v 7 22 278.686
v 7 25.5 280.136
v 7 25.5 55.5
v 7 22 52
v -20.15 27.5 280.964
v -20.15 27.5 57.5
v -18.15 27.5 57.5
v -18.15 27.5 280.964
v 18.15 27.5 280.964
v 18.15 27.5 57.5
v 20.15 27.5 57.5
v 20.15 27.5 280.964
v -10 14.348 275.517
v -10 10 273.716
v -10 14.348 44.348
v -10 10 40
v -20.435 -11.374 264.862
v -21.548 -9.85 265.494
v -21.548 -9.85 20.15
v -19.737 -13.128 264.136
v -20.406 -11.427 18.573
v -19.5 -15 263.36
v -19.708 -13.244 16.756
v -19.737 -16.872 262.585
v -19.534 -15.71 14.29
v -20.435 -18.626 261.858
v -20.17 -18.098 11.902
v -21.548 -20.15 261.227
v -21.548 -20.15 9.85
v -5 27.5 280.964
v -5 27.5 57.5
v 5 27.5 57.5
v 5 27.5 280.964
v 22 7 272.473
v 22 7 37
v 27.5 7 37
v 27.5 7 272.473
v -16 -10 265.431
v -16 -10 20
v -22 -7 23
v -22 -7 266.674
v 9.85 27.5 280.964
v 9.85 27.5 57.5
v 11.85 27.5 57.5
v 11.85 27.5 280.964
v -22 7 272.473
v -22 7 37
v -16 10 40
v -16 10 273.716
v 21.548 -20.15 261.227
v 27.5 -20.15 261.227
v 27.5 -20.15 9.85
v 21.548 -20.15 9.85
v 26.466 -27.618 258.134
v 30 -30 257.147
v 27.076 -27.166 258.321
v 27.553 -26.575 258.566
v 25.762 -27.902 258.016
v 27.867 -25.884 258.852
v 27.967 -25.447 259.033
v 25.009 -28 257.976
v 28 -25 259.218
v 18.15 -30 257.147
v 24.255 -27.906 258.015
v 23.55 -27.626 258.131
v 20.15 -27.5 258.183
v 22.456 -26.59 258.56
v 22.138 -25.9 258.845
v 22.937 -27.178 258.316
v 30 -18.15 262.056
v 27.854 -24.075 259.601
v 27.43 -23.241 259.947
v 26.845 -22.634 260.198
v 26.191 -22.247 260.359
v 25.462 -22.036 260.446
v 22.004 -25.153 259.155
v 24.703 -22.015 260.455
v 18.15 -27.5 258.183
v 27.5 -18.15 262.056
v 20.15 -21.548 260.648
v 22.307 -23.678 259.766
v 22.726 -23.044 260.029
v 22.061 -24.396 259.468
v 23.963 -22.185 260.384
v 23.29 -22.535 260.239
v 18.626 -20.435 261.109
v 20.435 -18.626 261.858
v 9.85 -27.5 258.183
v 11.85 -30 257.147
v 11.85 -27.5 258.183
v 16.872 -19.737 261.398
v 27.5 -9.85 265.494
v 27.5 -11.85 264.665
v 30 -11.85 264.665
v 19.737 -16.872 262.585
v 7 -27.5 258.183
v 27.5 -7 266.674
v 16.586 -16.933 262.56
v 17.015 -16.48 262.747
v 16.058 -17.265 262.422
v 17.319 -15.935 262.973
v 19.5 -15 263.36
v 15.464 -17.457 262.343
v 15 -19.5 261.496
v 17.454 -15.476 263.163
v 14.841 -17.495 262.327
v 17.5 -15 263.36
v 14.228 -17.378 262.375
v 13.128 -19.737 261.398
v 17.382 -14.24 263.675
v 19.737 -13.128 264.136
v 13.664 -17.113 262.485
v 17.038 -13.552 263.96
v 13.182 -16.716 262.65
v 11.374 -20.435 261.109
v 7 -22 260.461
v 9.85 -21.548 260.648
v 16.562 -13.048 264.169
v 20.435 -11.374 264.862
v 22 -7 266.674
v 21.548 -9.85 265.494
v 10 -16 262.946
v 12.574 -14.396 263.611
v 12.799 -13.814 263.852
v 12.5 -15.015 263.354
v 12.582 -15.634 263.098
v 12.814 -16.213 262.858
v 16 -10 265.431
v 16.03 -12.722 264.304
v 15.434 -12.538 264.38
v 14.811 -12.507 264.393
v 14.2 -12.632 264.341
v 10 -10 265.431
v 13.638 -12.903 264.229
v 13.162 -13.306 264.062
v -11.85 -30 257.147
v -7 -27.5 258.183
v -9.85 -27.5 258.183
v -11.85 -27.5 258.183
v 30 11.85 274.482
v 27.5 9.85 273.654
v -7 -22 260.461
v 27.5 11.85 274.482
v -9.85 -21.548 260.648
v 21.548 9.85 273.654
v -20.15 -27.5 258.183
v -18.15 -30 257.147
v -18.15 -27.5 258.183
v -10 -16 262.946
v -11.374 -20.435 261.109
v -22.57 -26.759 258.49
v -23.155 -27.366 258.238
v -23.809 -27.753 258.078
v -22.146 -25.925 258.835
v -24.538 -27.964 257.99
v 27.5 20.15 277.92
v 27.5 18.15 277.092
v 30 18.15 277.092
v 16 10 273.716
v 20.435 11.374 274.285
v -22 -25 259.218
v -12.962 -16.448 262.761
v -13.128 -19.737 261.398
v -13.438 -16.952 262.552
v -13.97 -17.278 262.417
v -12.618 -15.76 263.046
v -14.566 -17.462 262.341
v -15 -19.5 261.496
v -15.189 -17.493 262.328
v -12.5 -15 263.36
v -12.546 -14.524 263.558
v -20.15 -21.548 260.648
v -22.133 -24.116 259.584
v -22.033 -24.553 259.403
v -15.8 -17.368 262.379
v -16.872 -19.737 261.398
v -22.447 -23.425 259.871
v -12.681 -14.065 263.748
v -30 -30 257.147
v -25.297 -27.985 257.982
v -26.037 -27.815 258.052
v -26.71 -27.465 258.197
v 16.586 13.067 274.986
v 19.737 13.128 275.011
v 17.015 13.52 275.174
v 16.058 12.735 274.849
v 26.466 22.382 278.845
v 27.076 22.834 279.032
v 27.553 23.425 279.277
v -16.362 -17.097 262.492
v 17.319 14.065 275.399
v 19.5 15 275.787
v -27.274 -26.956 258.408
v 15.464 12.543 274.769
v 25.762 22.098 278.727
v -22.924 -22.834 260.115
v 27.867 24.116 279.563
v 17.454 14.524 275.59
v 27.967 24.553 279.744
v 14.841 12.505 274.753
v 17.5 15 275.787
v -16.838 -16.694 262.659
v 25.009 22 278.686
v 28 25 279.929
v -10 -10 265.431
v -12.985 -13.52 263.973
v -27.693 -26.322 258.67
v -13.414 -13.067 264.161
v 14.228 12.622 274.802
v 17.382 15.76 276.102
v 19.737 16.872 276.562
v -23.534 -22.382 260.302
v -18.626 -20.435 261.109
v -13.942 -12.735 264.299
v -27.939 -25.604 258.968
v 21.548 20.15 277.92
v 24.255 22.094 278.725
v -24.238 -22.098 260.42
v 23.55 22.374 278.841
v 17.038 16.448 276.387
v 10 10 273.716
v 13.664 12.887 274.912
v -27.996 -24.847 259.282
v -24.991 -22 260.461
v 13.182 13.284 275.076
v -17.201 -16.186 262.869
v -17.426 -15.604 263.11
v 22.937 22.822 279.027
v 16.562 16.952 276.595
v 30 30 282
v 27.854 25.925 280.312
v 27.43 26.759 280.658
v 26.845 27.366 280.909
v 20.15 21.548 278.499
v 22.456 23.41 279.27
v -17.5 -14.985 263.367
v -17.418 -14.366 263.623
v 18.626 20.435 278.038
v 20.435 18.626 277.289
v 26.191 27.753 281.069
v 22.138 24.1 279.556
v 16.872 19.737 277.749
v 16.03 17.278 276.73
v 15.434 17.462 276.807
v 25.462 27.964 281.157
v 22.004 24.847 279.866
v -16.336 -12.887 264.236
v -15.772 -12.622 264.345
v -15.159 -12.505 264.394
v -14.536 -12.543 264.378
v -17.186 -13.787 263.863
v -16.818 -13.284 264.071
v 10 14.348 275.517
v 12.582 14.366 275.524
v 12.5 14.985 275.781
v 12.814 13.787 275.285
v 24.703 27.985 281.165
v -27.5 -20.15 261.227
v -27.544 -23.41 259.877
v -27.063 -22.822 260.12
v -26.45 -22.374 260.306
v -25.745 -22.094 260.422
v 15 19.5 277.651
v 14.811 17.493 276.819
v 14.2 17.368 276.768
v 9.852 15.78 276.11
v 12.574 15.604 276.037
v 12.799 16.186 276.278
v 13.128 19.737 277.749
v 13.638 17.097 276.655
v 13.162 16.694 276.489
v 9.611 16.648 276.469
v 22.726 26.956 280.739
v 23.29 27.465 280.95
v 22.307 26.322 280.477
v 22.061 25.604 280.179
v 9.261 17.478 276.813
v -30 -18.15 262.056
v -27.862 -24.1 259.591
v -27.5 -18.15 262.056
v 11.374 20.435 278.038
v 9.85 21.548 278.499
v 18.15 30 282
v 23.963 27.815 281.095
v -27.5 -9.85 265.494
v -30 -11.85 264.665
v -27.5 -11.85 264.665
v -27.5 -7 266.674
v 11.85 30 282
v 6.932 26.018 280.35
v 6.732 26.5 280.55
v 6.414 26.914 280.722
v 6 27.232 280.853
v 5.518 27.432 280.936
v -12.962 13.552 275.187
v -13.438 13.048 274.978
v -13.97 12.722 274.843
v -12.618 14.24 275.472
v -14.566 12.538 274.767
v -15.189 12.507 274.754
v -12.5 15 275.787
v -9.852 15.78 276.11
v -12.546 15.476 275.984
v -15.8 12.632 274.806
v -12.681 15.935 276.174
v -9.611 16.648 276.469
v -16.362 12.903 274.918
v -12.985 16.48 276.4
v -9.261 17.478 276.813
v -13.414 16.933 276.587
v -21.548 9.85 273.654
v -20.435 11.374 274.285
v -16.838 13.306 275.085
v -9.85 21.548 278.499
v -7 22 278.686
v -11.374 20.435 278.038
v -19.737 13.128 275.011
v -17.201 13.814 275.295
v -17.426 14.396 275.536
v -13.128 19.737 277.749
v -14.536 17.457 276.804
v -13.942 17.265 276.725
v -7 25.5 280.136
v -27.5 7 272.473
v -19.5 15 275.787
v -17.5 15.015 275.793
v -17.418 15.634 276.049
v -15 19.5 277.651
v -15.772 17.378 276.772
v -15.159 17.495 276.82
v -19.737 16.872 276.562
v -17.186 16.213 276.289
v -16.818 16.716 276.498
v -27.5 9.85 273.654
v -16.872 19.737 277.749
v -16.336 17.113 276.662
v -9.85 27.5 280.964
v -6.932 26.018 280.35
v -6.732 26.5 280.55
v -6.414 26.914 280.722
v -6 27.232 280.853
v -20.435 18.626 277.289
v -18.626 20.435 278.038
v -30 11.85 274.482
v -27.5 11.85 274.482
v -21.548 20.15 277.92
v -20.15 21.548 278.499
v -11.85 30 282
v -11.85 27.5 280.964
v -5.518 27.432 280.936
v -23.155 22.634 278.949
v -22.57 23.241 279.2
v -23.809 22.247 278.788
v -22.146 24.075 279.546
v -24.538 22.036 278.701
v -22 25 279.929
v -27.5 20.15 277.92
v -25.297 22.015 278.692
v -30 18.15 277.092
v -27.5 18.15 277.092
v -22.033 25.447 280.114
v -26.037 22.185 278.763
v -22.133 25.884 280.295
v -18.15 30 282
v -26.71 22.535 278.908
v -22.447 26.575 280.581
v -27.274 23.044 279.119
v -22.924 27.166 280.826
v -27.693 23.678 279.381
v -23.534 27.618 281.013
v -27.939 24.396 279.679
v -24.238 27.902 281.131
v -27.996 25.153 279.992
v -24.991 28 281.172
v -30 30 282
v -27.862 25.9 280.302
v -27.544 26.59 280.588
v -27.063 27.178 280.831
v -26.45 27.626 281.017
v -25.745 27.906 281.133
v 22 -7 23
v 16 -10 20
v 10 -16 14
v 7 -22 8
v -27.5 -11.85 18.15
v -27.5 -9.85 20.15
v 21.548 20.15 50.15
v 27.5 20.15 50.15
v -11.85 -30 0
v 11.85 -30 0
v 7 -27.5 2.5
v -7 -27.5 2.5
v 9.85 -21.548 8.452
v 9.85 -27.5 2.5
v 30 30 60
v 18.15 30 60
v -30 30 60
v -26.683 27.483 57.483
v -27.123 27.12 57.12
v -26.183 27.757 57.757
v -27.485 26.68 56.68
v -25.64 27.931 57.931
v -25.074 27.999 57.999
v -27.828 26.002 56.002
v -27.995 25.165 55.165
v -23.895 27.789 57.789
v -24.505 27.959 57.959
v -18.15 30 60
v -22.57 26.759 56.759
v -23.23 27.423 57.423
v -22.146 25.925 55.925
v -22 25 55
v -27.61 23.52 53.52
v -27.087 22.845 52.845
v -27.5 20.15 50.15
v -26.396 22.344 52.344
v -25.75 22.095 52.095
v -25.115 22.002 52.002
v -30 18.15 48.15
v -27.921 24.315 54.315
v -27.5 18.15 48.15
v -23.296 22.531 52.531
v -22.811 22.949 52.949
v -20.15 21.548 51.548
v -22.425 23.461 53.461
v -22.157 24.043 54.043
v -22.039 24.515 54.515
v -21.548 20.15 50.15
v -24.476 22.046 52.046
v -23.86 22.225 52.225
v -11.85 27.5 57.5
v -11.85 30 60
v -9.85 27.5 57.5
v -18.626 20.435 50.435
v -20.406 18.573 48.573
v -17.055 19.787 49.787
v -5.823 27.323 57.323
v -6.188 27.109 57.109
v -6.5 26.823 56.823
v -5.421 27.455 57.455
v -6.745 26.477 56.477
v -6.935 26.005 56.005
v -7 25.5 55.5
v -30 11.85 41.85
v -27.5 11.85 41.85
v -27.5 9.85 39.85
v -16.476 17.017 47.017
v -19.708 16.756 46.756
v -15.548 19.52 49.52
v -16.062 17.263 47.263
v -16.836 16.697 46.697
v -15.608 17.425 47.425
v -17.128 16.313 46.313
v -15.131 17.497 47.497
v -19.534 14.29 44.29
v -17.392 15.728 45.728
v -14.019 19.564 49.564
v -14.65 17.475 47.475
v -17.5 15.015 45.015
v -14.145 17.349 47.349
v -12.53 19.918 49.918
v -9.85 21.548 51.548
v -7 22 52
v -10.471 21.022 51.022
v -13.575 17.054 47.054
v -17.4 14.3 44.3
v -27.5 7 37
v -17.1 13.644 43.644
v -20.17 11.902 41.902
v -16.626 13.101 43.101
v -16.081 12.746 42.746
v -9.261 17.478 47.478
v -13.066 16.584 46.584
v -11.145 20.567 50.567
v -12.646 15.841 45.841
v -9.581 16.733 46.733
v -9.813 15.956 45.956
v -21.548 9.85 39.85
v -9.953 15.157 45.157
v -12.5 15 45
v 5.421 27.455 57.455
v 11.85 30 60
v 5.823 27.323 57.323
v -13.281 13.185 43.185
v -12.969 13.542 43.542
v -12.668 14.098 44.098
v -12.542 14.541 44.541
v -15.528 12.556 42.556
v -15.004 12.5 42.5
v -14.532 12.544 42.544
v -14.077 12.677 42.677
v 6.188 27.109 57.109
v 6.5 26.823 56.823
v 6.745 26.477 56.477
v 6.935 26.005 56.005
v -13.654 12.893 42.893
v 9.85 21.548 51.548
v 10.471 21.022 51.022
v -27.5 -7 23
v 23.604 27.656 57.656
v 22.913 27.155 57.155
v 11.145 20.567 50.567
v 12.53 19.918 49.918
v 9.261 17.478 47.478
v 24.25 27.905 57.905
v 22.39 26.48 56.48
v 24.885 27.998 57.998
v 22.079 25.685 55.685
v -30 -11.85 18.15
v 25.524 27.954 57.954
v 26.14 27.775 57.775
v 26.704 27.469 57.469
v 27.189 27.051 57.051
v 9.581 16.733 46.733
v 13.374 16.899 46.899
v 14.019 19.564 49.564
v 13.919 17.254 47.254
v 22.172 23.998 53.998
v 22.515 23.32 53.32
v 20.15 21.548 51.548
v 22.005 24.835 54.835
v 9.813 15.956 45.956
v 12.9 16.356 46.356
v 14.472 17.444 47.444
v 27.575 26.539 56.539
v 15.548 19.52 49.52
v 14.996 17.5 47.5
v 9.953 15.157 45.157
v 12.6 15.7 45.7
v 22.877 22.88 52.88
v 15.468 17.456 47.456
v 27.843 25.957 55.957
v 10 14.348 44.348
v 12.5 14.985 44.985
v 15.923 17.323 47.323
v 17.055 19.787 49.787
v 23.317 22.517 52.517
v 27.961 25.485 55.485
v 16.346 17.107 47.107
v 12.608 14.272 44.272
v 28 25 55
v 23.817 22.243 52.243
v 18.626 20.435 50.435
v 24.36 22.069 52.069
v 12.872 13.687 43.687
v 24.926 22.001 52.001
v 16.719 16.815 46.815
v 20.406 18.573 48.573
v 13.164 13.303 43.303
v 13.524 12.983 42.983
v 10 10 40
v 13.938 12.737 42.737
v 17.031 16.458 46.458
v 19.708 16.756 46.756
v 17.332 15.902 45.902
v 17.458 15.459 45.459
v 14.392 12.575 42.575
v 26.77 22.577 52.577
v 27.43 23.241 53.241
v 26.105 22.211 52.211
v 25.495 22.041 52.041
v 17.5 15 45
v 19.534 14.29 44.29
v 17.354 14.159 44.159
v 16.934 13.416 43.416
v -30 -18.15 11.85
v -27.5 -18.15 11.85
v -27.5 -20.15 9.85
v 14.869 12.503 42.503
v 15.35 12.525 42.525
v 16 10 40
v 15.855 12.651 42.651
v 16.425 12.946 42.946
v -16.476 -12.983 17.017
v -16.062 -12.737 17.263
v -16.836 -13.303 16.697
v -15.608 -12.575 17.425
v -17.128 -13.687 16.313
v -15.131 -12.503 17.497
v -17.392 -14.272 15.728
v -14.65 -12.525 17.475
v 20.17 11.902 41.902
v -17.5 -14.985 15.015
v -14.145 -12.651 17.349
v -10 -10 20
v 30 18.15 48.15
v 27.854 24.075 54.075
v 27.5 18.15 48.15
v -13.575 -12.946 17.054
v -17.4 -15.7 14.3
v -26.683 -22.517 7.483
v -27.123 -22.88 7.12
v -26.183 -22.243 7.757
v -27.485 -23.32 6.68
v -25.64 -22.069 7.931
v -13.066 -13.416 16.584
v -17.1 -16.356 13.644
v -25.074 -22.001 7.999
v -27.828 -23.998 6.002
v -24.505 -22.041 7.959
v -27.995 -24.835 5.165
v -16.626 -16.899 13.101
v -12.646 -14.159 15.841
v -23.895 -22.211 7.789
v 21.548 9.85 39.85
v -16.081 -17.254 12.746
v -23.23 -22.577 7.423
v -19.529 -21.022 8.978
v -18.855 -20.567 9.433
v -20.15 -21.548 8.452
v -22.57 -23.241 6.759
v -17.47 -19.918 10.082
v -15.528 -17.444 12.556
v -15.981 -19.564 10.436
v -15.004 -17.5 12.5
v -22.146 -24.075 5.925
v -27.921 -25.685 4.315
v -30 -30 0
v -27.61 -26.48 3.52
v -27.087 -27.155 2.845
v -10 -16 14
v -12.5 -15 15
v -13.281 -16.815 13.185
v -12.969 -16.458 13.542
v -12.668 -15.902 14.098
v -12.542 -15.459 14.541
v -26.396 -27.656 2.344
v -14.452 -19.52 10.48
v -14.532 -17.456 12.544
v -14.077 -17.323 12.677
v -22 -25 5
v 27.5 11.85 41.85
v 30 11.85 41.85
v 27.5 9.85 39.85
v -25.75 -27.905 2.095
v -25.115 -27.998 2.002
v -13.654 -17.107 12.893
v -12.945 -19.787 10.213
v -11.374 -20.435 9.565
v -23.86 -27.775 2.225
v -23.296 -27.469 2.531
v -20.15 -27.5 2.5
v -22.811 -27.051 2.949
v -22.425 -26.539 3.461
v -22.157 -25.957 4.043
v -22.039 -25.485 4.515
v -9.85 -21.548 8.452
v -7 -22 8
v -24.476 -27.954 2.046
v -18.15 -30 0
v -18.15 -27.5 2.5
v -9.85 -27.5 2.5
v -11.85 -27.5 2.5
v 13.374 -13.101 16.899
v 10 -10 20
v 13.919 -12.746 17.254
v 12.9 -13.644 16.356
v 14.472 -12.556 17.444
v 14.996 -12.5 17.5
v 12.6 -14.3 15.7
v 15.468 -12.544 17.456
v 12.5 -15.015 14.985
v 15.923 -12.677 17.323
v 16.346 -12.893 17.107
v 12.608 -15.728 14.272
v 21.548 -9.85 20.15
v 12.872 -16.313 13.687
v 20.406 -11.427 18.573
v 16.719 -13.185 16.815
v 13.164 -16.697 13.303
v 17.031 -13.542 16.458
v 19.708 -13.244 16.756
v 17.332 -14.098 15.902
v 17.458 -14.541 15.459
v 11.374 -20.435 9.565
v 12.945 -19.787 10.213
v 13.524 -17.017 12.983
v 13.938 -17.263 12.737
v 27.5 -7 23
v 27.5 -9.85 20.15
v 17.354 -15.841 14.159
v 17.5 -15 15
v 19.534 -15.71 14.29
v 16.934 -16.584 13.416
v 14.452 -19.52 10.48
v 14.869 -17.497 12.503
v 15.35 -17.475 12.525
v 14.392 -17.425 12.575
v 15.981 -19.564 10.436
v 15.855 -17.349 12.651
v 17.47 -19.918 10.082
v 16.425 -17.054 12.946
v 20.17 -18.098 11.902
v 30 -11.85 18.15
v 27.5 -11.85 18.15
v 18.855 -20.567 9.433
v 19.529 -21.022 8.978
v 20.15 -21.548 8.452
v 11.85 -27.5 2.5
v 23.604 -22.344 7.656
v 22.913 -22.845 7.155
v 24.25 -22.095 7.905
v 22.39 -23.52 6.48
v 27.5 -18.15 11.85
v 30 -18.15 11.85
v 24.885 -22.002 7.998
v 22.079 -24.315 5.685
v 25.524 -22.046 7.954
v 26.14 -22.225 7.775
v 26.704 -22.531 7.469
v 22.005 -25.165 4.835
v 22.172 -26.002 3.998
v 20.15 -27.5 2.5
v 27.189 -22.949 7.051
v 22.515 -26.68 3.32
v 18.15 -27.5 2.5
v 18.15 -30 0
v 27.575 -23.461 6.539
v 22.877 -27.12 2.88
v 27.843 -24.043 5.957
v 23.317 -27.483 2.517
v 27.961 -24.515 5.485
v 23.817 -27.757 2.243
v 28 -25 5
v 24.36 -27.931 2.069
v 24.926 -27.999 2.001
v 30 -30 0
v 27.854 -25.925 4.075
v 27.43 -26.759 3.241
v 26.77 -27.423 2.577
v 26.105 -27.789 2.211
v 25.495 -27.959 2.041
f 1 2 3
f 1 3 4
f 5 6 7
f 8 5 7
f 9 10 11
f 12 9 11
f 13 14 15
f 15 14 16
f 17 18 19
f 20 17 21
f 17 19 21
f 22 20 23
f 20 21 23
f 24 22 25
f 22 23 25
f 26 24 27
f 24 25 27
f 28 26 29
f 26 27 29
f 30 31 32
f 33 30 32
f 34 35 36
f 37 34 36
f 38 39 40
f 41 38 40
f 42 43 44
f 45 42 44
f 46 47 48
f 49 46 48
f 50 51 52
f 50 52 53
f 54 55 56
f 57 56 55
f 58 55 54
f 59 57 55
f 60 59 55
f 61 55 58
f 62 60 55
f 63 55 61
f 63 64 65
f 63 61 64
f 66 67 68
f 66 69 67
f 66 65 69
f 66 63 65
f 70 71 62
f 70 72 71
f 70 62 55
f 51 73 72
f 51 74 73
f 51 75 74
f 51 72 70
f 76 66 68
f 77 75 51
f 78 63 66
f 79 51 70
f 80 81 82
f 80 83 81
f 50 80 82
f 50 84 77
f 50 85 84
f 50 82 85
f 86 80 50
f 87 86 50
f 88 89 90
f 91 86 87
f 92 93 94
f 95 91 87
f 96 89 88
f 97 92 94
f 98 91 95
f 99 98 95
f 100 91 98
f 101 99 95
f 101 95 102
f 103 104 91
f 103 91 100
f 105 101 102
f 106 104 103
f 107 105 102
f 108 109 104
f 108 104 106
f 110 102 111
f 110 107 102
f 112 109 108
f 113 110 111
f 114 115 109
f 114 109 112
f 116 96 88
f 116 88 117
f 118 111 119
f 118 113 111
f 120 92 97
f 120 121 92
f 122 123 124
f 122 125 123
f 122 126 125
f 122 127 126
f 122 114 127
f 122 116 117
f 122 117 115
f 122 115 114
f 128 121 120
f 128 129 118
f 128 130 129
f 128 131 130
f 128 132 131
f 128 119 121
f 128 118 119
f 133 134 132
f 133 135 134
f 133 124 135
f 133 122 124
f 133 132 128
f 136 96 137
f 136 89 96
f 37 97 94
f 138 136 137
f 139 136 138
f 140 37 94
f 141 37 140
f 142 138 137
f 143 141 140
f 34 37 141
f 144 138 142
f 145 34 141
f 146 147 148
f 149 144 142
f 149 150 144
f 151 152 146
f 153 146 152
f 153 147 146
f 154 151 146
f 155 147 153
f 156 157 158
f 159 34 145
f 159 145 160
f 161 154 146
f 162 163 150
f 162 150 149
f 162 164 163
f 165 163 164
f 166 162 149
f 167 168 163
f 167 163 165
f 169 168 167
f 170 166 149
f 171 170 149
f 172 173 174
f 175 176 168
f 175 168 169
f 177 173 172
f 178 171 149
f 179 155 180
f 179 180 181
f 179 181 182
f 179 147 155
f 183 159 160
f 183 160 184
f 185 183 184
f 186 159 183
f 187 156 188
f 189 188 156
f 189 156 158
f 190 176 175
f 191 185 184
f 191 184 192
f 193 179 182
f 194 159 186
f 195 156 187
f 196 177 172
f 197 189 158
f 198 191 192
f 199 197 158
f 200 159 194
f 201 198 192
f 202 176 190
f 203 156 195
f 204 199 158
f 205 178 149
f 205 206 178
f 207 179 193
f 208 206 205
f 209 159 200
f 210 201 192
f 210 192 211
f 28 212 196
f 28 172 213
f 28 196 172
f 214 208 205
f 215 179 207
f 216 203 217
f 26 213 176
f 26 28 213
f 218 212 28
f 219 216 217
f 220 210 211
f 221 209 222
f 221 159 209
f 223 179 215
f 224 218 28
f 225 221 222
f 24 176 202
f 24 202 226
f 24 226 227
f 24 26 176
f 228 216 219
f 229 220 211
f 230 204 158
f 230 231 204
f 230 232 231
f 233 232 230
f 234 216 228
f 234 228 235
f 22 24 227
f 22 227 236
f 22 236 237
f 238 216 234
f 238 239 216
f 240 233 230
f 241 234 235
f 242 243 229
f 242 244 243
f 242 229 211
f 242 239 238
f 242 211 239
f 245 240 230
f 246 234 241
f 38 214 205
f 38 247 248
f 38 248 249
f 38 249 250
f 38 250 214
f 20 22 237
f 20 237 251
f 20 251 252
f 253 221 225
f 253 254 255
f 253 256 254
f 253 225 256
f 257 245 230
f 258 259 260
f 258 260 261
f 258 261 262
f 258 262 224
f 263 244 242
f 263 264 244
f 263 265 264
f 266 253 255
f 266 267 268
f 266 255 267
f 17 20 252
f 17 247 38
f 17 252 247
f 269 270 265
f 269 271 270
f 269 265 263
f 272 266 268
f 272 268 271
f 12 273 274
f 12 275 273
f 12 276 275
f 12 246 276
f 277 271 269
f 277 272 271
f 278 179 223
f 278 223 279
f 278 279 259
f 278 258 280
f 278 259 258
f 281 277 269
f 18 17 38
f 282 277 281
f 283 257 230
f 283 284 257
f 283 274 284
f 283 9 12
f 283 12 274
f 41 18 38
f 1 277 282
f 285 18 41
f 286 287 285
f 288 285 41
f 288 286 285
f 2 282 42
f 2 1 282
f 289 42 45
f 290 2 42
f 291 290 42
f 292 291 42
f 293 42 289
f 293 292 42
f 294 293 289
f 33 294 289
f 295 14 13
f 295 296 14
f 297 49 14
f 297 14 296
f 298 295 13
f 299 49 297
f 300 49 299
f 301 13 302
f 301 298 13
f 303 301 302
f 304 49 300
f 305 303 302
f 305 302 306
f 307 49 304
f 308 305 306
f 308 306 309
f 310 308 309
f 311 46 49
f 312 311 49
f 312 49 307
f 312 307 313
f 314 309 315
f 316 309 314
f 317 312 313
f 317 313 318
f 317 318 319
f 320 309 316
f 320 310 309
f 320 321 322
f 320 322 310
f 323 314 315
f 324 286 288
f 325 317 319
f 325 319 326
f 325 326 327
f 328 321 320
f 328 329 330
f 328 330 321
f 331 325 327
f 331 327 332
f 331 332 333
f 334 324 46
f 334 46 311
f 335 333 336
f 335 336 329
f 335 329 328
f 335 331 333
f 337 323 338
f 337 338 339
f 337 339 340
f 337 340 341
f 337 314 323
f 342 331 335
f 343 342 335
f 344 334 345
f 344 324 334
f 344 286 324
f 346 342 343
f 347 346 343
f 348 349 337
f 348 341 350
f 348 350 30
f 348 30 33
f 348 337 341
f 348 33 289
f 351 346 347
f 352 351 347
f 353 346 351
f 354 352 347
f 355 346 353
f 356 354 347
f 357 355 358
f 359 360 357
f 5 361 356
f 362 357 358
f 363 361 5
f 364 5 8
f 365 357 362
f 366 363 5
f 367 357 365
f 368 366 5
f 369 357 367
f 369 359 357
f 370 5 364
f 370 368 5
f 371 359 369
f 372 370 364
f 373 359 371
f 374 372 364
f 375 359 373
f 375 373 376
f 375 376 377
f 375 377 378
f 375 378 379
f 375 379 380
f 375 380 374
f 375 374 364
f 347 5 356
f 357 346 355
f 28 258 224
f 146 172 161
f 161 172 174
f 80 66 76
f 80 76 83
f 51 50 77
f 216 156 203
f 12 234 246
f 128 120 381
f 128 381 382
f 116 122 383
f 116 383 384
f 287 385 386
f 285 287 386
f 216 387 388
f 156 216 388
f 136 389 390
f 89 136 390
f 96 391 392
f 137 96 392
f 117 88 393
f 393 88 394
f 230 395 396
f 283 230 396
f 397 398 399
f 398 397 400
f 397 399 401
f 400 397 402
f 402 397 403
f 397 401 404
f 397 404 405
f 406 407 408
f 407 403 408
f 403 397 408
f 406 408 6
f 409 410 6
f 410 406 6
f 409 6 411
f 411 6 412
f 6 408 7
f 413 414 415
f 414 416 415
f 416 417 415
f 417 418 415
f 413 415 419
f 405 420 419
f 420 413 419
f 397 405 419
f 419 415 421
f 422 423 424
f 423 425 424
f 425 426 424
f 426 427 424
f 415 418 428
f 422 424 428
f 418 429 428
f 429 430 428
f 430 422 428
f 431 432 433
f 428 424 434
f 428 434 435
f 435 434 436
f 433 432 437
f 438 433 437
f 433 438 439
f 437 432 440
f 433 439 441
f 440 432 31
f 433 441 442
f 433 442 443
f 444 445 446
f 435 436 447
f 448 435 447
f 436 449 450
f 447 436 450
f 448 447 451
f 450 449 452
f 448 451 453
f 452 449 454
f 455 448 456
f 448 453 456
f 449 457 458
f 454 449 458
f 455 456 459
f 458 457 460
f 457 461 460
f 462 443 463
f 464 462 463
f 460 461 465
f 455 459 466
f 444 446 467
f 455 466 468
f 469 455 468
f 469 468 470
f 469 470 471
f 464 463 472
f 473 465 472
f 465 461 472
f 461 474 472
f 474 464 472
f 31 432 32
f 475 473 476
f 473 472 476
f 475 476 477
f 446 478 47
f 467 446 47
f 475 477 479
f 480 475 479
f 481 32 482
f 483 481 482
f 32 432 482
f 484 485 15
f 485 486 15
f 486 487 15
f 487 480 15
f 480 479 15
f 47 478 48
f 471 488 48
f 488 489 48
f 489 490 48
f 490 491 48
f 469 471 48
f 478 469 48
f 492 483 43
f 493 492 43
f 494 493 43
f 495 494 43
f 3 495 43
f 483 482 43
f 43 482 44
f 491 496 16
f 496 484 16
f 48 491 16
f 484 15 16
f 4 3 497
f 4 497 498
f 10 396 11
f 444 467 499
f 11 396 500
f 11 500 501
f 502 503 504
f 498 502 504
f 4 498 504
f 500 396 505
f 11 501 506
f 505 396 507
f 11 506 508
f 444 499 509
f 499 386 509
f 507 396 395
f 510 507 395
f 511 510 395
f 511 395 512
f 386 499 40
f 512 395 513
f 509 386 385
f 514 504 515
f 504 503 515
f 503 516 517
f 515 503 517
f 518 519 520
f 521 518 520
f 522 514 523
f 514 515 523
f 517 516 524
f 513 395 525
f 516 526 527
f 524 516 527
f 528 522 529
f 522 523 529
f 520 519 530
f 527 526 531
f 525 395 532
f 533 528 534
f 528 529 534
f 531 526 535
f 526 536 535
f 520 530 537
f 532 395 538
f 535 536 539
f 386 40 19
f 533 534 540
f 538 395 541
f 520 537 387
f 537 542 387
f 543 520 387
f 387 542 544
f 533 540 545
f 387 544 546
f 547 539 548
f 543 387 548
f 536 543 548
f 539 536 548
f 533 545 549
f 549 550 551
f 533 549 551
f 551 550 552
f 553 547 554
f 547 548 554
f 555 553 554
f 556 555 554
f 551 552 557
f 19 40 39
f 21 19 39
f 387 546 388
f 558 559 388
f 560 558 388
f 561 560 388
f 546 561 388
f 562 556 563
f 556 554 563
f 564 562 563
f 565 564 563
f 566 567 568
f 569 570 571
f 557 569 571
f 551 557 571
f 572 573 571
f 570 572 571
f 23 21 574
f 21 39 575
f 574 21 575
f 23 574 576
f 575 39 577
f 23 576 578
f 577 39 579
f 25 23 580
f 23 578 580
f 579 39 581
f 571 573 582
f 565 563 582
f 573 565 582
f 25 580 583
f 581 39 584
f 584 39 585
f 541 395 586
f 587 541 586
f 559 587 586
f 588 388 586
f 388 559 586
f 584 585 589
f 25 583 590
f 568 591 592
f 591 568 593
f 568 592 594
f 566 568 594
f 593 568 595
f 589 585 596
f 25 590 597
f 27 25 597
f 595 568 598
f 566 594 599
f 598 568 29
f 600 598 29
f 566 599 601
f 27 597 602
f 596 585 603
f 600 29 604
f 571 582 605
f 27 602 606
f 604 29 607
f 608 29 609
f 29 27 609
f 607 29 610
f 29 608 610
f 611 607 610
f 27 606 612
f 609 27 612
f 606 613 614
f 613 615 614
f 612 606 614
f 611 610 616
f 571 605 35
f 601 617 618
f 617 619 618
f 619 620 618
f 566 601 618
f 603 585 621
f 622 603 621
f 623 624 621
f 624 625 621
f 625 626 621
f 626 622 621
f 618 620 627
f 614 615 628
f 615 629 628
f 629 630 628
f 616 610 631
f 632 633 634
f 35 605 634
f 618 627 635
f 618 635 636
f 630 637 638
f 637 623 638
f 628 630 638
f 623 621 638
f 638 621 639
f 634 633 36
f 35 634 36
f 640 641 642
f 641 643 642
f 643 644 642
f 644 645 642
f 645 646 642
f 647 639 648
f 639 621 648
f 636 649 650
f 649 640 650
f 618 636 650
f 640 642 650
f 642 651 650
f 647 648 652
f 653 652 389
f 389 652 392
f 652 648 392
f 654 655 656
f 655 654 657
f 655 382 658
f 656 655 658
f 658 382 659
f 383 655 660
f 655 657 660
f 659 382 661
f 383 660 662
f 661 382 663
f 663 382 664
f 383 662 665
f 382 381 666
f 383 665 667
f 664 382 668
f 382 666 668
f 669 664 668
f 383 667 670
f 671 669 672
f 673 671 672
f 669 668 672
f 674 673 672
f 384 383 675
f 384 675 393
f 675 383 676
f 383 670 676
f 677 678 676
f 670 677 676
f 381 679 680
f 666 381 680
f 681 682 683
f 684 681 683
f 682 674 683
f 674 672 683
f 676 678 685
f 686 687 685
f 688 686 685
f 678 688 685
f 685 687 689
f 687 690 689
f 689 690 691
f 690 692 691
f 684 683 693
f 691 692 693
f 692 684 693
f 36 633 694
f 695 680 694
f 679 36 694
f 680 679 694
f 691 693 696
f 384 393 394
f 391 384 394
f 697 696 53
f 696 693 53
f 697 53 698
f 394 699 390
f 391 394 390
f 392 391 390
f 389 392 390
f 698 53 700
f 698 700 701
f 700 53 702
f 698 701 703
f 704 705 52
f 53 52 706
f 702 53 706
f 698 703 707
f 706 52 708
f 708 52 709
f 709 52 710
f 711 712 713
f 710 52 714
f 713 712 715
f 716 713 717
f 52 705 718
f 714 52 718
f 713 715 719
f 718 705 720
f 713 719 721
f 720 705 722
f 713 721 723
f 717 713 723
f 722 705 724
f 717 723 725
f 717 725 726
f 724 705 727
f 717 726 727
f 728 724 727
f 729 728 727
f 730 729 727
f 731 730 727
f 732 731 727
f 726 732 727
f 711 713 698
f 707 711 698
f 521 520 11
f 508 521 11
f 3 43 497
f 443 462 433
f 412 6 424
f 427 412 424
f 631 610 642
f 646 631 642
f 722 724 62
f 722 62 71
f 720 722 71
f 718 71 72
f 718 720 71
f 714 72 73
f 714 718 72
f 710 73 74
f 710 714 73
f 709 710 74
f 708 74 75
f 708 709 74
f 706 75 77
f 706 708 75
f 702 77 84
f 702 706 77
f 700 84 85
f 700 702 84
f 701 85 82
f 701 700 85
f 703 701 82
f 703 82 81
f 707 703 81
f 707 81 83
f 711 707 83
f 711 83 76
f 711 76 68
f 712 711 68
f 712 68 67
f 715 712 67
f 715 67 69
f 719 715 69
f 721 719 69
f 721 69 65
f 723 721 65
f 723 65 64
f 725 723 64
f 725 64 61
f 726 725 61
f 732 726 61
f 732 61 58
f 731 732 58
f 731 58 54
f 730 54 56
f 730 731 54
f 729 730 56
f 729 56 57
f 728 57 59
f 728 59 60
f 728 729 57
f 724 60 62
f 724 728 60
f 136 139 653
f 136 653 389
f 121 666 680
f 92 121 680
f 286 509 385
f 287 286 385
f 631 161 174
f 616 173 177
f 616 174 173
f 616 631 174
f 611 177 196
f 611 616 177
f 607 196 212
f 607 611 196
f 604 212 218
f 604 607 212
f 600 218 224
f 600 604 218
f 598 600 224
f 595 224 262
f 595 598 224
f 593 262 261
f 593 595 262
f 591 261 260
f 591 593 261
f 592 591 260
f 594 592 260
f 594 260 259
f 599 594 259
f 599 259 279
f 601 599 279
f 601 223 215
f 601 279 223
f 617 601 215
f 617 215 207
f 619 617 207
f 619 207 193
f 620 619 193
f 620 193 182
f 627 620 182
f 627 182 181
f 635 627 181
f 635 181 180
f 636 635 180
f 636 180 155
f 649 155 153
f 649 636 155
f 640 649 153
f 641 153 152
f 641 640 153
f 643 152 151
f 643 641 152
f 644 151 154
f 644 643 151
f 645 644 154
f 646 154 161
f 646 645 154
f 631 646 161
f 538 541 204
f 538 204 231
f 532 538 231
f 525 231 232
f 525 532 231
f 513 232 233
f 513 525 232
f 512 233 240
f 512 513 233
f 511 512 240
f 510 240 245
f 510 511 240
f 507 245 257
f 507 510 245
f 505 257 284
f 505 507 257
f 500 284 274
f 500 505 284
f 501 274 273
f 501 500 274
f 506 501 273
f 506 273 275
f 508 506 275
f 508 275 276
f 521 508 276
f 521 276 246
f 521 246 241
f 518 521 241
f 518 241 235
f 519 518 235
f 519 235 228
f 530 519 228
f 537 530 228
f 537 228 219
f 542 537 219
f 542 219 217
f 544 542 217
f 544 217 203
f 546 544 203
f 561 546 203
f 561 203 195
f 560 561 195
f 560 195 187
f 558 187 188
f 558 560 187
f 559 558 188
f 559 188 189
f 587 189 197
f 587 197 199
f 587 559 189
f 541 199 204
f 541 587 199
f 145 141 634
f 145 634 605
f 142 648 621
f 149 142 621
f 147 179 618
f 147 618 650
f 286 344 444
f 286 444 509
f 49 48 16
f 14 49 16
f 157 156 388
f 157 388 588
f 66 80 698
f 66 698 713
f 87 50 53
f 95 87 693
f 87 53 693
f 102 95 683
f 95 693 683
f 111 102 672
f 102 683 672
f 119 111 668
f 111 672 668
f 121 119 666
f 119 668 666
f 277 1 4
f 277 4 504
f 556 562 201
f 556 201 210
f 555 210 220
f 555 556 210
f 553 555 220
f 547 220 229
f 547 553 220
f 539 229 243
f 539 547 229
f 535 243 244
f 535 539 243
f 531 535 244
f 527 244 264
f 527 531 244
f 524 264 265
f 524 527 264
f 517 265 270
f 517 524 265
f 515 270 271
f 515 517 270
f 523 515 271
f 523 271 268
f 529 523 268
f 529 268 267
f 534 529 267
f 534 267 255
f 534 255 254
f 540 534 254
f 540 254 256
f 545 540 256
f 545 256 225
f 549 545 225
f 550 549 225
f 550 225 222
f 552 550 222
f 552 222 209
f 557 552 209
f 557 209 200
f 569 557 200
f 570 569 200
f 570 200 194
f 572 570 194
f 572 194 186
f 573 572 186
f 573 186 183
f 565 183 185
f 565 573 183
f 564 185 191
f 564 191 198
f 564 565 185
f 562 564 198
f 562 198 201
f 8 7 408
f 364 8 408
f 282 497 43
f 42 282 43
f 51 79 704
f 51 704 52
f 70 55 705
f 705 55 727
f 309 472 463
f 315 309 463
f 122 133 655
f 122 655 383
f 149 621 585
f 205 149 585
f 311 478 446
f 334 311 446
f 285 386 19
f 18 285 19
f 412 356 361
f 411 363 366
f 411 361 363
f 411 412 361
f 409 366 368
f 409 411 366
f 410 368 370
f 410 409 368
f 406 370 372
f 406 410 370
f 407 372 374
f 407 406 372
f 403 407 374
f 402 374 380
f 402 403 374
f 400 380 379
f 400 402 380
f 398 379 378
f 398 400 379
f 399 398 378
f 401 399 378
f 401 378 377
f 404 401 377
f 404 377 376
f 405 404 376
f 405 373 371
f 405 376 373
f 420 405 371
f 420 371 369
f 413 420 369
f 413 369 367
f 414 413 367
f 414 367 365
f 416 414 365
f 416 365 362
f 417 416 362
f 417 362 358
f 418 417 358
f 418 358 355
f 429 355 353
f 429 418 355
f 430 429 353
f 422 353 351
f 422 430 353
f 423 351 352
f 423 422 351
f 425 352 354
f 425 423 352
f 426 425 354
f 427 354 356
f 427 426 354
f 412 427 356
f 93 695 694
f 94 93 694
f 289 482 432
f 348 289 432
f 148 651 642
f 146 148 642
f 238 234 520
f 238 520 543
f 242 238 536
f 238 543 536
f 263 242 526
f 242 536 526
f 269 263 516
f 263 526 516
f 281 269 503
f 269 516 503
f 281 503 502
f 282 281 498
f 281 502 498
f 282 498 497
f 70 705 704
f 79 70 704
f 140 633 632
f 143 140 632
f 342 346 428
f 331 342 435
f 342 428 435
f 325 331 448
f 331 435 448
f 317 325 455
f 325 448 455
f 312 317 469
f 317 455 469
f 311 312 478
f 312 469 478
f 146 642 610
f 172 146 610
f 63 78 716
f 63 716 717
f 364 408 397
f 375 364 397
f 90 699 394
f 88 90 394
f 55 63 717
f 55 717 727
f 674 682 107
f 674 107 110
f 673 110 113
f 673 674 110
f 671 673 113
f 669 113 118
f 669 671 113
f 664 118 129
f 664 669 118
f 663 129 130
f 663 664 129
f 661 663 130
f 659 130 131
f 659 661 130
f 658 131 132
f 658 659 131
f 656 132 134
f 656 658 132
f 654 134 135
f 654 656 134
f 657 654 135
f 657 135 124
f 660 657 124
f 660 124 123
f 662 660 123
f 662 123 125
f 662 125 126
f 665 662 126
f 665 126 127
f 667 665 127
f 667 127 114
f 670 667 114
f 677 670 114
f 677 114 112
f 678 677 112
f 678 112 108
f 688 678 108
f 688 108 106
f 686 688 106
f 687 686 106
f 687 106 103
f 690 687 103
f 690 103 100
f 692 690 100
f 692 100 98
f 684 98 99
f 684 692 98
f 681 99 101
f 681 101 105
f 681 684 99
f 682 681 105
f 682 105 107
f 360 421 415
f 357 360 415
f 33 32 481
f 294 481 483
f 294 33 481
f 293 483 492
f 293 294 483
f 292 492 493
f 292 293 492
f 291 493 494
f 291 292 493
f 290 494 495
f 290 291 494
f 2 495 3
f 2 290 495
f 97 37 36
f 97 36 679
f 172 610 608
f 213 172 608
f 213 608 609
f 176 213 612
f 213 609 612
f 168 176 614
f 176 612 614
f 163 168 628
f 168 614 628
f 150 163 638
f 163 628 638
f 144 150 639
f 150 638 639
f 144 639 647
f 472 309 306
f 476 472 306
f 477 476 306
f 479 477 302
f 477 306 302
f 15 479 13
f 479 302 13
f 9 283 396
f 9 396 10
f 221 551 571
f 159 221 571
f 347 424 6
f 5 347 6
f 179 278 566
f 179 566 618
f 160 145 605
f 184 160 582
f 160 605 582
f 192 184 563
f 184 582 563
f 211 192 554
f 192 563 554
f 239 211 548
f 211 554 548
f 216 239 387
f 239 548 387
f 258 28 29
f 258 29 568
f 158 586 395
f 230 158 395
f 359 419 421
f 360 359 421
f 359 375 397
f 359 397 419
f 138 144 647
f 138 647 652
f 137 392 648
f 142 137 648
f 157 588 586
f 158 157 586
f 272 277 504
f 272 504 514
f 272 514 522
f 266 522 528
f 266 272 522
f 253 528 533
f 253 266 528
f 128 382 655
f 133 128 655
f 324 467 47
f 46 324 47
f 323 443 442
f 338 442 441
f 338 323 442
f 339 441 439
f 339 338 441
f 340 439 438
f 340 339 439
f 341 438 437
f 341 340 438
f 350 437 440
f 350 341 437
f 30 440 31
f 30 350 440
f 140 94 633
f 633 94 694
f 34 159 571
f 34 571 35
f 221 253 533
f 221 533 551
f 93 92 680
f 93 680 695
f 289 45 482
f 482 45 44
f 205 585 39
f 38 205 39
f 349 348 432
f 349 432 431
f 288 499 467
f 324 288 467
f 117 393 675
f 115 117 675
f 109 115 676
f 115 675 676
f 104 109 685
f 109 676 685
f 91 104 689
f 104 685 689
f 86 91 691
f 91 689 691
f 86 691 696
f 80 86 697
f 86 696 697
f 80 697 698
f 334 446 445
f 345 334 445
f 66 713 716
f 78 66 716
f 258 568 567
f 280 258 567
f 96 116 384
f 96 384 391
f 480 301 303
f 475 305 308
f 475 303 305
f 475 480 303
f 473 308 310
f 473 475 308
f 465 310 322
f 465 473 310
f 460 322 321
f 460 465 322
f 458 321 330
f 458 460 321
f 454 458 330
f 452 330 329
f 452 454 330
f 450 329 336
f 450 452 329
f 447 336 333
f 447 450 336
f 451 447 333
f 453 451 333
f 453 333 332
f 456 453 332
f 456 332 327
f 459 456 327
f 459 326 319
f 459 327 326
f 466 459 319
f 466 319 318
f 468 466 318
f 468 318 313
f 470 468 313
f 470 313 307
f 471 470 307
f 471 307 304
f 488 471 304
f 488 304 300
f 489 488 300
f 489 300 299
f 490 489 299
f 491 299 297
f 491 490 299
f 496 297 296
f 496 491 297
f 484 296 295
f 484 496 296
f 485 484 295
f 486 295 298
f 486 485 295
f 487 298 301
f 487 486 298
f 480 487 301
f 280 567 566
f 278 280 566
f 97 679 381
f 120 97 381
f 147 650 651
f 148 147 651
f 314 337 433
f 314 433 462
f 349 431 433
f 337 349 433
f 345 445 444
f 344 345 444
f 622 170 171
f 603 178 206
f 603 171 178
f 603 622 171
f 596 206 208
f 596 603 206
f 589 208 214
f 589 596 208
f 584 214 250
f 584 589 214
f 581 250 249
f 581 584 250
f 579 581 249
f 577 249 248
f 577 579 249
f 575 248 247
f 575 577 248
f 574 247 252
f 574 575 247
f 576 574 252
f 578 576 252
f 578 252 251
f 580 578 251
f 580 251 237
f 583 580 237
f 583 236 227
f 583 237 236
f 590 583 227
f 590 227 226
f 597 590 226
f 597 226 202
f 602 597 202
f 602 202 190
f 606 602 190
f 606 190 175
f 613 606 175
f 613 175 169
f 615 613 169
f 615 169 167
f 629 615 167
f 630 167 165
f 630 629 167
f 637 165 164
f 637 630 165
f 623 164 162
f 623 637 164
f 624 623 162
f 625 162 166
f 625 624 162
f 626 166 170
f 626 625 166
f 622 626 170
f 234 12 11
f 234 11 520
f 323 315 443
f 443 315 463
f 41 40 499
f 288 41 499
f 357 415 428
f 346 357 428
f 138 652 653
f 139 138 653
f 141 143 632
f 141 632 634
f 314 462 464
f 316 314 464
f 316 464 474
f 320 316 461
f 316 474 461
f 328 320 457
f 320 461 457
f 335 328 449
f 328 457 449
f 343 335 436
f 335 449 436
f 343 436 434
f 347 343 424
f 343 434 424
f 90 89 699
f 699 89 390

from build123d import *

# Parameters (mm, degrees)
F0_R          = 3
F0_R_2        = 2.5
F1_DEPTH      = 282
F2_R          = 2
F3_R          = 7
F6_DEPTH      = 30
F6_DEPTH_BACK = 30


# Not quite as in the source:
# - a feature names something its author has since deleted; it is built from what else it names


with BuildPart() as f1:
    # F0 (on Top) → F1 (new body)
    with BuildSketch(Plane.XY):
        with BuildLine():
            Line((18.15, -30), (30, -30))
            Line((30, -30), (30, -18.15))
            Line((30, -18.15), (27.5, -18.15))
            Line((27.5, -18.15), (27.5, -20.15))
            Line((27.5, -20.15), (21.5477069044, -20.15))
            ThreePointArc((21.5477069044, -20.15), (19.5, -15), (21.5477069044, -9.85))
            Line((21.5477069044, -9.85), (27.5, -9.85))
            Line((27.5, -9.85), (27.5, -11.85))
            Line((27.5, -11.85), (30, -11.85))
            Line((30, -11.85), (30, 11.85))
            Line((30, 11.85), (27.5, 11.85))
            Line((27.5, 11.85), (27.5, 9.85))
            Line((27.5, 9.85), (21.5477069044, 9.85))
            ThreePointArc((21.5477069044, 9.85), (19.5, 15), (21.5477069044, 20.15))
            Line((21.5477069044, 20.15), (27.5, 20.15))
            Line((27.5, 20.15), (27.5, 18.15))
            Line((27.5, 18.15), (30, 18.15))
            Line((30, 18.15), (30, 30))
            Line((30, 30), (18.15, 30))
            Line((18.15, 30), (18.15, 27.5))
            Line((18.15, 27.5), (20.15, 27.5))
            Line((20.15, 27.5), (20.15, 21.5477069044))
            ThreePointArc((20.15, 21.5477069044), (15, 19.5), (9.85, 21.5477069044))
            Line((9.85, 21.5477069044), (9.85, 27.5))
            Line((9.85, 27.5), (11.85, 27.5))
            Line((11.85, 27.5), (11.85, 30))
            Line((11.85, 30), (-11.85, 30))
            Line((-11.85, 30), (-11.85, 27.5))
            Line((-11.85, 27.5), (-9.85, 27.5))
            Line((-9.85, 27.5), (-9.85, 21.5477069044))
            ThreePointArc((-9.85, 21.5477069044), (-15, 19.5), (-20.15, 21.5477069044))
            Line((-20.15, 21.5477069044), (-20.15, 27.5))
            Line((-20.15, 27.5), (-18.15, 27.5))
            Line((-18.15, 27.5), (-18.15, 30))
            Line((-18.15, 30), (-30, 30))
            Line((-30, 30), (-30, 18.15))
            Line((-30, 18.15), (-27.5, 18.15))
            Line((-27.5, 18.15), (-27.5, 20.15))
            Line((-27.5, 20.15), (-21.5477069044, 20.15))
            ThreePointArc((-21.5477069044, 20.15), (-19.5, 15), (-21.5477069044, 9.85))
            Line((-21.5477069044, 9.85), (-27.5, 9.85))
            Line((-27.5, 9.85), (-27.5, 11.85))
            Line((-27.5, 11.85), (-30, 11.85))
            Line((-30, 11.85), (-30, -11.85))
            Line((-30, -11.85), (-27.5, -11.85))
            Line((-27.5, -11.85), (-27.5, -9.85))
            Line((-27.5, -9.85), (-21.5477069044, -9.85))
            ThreePointArc((-21.5477069044, -9.85), (-19.5, -15), (-21.5477069044, -20.15))
            Line((-21.5477069044, -20.15), (-27.5, -20.15))
            Line((-27.5, -20.15), (-27.5, -18.15))
            Line((-27.5, -18.15), (-30, -18.15))
            Line((-30, -18.15), (-30, -30))
            Line((-30, -30), (-18.15, -30))
            Line((-18.15, -30), (-18.15, -27.5))
            Line((-18.15, -27.5), (-20.15, -27.5))
            Line((-20.15, -27.5), (-20.15, -21.5477069044))
            ThreePointArc((-20.15, -21.5477069044), (-15, -19.5), (-9.85, -21.5477069044))
            Line((-9.85, -21.5477069044), (-9.85, -27.5))
            Line((-9.85, -27.5), (-11.85, -27.5))
            Line((-11.85, -27.5), (-11.85, -30))
            Line((-11.85, -30), (11.85, -30))
            Line((11.85, -30), (11.85, -27.5))
            Line((11.85, -27.5), (9.85, -27.5))
            Line((9.85, -27.5), (9.85, -21.5477069044))
            ThreePointArc((9.85, -21.5477069044), (15, -19.5), (20.15, -21.5477069044))
            Line((20.15, -21.5477069044), (20.15, -27.5))
            Line((20.15, -27.5), (18.15, -27.5))
            Line((18.15, -27.5), (18.15, -30))
        make_face()
        with Locations((-25, -25)):
            Circle(F0_R, mode=Mode.SUBTRACT)
        with Locations((-15, -15)):
            Circle(F0_R_2, mode=Mode.SUBTRACT)
        with Locations((25, -25)):
            Circle(F0_R, mode=Mode.SUBTRACT)
        with Locations((15, -15)):
            Circle(F0_R_2, mode=Mode.SUBTRACT)
        with Locations((-25, 25)):
            Circle(F0_R, mode=Mode.SUBTRACT)
        with Locations((-15, 15)):
            Circle(F0_R_2, mode=Mode.SUBTRACT)
        Polygon((-7, 22), (-7, 27.5), (0, 27.5), (7, 27.5), (7, 22), (10, 16), (10, 10), (16, 10), (22, 7), (27.5, 7), (27.5, 0), (27.5, -7), (22, -7), (16, -10), (10, -10), (10, -16), (7, -22), (7, -27.5), (0, -27.5), (-7, -27.5), (-7, -22), (-10, -16), (-10, -10), (-16, -10), (-22, -7), (-27.5, -7), (-27.5, 0), (-27.5, 7), (-22, 7), (-16, 10), (-10, 10), (-10, 16), align=None, mode=Mode.SUBTRACT)
        with Locations((15, 15)):
            Circle(F0_R_2, mode=Mode.SUBTRACT)
        with Locations((25, 25)):
            Circle(F0_R, mode=Mode.SUBTRACT)
    extrude(amount=F1_DEPTH)

    # F2
    f2_edges = [f1.edges().sort_by_distance(p)[0] for p in [
        (-7, 27.5, 141),
        (7, 27.5, 141),
    ]]
    fillet(f2_edges, radius=F2_R)

    # F3
    f3_edges = [f1.edges().sort_by_distance(p)[0] for p in [
        (-10, 16, 141),
        (10, 16, 141),
    ]]
    fillet(f3_edges, radius=F3_R)

    # F5 (on Right) → F6 (cut, two sides)
    with BuildSketch(Plane.YZ) as f6_sk:
        Polygon((115.2614038106, 44.5196963257), (64.8905500682, 94.8905500682), (-30, 0), (20.3708537424, -50.3708537424), align=None)
        Polygon((30, 282), (-7.7241411908, 373.0741332917), (-157.9632044753, 310.843075681), (-120.2390632845, 219.7689423893), align=None)
    extrude(amount=F6_DEPTH, mode=Mode.SUBTRACT)
    extrude(f6_sk.sketch, amount=-F6_DEPTH_BACK, mode=Mode.SUBTRACT)


solid = f1.part
